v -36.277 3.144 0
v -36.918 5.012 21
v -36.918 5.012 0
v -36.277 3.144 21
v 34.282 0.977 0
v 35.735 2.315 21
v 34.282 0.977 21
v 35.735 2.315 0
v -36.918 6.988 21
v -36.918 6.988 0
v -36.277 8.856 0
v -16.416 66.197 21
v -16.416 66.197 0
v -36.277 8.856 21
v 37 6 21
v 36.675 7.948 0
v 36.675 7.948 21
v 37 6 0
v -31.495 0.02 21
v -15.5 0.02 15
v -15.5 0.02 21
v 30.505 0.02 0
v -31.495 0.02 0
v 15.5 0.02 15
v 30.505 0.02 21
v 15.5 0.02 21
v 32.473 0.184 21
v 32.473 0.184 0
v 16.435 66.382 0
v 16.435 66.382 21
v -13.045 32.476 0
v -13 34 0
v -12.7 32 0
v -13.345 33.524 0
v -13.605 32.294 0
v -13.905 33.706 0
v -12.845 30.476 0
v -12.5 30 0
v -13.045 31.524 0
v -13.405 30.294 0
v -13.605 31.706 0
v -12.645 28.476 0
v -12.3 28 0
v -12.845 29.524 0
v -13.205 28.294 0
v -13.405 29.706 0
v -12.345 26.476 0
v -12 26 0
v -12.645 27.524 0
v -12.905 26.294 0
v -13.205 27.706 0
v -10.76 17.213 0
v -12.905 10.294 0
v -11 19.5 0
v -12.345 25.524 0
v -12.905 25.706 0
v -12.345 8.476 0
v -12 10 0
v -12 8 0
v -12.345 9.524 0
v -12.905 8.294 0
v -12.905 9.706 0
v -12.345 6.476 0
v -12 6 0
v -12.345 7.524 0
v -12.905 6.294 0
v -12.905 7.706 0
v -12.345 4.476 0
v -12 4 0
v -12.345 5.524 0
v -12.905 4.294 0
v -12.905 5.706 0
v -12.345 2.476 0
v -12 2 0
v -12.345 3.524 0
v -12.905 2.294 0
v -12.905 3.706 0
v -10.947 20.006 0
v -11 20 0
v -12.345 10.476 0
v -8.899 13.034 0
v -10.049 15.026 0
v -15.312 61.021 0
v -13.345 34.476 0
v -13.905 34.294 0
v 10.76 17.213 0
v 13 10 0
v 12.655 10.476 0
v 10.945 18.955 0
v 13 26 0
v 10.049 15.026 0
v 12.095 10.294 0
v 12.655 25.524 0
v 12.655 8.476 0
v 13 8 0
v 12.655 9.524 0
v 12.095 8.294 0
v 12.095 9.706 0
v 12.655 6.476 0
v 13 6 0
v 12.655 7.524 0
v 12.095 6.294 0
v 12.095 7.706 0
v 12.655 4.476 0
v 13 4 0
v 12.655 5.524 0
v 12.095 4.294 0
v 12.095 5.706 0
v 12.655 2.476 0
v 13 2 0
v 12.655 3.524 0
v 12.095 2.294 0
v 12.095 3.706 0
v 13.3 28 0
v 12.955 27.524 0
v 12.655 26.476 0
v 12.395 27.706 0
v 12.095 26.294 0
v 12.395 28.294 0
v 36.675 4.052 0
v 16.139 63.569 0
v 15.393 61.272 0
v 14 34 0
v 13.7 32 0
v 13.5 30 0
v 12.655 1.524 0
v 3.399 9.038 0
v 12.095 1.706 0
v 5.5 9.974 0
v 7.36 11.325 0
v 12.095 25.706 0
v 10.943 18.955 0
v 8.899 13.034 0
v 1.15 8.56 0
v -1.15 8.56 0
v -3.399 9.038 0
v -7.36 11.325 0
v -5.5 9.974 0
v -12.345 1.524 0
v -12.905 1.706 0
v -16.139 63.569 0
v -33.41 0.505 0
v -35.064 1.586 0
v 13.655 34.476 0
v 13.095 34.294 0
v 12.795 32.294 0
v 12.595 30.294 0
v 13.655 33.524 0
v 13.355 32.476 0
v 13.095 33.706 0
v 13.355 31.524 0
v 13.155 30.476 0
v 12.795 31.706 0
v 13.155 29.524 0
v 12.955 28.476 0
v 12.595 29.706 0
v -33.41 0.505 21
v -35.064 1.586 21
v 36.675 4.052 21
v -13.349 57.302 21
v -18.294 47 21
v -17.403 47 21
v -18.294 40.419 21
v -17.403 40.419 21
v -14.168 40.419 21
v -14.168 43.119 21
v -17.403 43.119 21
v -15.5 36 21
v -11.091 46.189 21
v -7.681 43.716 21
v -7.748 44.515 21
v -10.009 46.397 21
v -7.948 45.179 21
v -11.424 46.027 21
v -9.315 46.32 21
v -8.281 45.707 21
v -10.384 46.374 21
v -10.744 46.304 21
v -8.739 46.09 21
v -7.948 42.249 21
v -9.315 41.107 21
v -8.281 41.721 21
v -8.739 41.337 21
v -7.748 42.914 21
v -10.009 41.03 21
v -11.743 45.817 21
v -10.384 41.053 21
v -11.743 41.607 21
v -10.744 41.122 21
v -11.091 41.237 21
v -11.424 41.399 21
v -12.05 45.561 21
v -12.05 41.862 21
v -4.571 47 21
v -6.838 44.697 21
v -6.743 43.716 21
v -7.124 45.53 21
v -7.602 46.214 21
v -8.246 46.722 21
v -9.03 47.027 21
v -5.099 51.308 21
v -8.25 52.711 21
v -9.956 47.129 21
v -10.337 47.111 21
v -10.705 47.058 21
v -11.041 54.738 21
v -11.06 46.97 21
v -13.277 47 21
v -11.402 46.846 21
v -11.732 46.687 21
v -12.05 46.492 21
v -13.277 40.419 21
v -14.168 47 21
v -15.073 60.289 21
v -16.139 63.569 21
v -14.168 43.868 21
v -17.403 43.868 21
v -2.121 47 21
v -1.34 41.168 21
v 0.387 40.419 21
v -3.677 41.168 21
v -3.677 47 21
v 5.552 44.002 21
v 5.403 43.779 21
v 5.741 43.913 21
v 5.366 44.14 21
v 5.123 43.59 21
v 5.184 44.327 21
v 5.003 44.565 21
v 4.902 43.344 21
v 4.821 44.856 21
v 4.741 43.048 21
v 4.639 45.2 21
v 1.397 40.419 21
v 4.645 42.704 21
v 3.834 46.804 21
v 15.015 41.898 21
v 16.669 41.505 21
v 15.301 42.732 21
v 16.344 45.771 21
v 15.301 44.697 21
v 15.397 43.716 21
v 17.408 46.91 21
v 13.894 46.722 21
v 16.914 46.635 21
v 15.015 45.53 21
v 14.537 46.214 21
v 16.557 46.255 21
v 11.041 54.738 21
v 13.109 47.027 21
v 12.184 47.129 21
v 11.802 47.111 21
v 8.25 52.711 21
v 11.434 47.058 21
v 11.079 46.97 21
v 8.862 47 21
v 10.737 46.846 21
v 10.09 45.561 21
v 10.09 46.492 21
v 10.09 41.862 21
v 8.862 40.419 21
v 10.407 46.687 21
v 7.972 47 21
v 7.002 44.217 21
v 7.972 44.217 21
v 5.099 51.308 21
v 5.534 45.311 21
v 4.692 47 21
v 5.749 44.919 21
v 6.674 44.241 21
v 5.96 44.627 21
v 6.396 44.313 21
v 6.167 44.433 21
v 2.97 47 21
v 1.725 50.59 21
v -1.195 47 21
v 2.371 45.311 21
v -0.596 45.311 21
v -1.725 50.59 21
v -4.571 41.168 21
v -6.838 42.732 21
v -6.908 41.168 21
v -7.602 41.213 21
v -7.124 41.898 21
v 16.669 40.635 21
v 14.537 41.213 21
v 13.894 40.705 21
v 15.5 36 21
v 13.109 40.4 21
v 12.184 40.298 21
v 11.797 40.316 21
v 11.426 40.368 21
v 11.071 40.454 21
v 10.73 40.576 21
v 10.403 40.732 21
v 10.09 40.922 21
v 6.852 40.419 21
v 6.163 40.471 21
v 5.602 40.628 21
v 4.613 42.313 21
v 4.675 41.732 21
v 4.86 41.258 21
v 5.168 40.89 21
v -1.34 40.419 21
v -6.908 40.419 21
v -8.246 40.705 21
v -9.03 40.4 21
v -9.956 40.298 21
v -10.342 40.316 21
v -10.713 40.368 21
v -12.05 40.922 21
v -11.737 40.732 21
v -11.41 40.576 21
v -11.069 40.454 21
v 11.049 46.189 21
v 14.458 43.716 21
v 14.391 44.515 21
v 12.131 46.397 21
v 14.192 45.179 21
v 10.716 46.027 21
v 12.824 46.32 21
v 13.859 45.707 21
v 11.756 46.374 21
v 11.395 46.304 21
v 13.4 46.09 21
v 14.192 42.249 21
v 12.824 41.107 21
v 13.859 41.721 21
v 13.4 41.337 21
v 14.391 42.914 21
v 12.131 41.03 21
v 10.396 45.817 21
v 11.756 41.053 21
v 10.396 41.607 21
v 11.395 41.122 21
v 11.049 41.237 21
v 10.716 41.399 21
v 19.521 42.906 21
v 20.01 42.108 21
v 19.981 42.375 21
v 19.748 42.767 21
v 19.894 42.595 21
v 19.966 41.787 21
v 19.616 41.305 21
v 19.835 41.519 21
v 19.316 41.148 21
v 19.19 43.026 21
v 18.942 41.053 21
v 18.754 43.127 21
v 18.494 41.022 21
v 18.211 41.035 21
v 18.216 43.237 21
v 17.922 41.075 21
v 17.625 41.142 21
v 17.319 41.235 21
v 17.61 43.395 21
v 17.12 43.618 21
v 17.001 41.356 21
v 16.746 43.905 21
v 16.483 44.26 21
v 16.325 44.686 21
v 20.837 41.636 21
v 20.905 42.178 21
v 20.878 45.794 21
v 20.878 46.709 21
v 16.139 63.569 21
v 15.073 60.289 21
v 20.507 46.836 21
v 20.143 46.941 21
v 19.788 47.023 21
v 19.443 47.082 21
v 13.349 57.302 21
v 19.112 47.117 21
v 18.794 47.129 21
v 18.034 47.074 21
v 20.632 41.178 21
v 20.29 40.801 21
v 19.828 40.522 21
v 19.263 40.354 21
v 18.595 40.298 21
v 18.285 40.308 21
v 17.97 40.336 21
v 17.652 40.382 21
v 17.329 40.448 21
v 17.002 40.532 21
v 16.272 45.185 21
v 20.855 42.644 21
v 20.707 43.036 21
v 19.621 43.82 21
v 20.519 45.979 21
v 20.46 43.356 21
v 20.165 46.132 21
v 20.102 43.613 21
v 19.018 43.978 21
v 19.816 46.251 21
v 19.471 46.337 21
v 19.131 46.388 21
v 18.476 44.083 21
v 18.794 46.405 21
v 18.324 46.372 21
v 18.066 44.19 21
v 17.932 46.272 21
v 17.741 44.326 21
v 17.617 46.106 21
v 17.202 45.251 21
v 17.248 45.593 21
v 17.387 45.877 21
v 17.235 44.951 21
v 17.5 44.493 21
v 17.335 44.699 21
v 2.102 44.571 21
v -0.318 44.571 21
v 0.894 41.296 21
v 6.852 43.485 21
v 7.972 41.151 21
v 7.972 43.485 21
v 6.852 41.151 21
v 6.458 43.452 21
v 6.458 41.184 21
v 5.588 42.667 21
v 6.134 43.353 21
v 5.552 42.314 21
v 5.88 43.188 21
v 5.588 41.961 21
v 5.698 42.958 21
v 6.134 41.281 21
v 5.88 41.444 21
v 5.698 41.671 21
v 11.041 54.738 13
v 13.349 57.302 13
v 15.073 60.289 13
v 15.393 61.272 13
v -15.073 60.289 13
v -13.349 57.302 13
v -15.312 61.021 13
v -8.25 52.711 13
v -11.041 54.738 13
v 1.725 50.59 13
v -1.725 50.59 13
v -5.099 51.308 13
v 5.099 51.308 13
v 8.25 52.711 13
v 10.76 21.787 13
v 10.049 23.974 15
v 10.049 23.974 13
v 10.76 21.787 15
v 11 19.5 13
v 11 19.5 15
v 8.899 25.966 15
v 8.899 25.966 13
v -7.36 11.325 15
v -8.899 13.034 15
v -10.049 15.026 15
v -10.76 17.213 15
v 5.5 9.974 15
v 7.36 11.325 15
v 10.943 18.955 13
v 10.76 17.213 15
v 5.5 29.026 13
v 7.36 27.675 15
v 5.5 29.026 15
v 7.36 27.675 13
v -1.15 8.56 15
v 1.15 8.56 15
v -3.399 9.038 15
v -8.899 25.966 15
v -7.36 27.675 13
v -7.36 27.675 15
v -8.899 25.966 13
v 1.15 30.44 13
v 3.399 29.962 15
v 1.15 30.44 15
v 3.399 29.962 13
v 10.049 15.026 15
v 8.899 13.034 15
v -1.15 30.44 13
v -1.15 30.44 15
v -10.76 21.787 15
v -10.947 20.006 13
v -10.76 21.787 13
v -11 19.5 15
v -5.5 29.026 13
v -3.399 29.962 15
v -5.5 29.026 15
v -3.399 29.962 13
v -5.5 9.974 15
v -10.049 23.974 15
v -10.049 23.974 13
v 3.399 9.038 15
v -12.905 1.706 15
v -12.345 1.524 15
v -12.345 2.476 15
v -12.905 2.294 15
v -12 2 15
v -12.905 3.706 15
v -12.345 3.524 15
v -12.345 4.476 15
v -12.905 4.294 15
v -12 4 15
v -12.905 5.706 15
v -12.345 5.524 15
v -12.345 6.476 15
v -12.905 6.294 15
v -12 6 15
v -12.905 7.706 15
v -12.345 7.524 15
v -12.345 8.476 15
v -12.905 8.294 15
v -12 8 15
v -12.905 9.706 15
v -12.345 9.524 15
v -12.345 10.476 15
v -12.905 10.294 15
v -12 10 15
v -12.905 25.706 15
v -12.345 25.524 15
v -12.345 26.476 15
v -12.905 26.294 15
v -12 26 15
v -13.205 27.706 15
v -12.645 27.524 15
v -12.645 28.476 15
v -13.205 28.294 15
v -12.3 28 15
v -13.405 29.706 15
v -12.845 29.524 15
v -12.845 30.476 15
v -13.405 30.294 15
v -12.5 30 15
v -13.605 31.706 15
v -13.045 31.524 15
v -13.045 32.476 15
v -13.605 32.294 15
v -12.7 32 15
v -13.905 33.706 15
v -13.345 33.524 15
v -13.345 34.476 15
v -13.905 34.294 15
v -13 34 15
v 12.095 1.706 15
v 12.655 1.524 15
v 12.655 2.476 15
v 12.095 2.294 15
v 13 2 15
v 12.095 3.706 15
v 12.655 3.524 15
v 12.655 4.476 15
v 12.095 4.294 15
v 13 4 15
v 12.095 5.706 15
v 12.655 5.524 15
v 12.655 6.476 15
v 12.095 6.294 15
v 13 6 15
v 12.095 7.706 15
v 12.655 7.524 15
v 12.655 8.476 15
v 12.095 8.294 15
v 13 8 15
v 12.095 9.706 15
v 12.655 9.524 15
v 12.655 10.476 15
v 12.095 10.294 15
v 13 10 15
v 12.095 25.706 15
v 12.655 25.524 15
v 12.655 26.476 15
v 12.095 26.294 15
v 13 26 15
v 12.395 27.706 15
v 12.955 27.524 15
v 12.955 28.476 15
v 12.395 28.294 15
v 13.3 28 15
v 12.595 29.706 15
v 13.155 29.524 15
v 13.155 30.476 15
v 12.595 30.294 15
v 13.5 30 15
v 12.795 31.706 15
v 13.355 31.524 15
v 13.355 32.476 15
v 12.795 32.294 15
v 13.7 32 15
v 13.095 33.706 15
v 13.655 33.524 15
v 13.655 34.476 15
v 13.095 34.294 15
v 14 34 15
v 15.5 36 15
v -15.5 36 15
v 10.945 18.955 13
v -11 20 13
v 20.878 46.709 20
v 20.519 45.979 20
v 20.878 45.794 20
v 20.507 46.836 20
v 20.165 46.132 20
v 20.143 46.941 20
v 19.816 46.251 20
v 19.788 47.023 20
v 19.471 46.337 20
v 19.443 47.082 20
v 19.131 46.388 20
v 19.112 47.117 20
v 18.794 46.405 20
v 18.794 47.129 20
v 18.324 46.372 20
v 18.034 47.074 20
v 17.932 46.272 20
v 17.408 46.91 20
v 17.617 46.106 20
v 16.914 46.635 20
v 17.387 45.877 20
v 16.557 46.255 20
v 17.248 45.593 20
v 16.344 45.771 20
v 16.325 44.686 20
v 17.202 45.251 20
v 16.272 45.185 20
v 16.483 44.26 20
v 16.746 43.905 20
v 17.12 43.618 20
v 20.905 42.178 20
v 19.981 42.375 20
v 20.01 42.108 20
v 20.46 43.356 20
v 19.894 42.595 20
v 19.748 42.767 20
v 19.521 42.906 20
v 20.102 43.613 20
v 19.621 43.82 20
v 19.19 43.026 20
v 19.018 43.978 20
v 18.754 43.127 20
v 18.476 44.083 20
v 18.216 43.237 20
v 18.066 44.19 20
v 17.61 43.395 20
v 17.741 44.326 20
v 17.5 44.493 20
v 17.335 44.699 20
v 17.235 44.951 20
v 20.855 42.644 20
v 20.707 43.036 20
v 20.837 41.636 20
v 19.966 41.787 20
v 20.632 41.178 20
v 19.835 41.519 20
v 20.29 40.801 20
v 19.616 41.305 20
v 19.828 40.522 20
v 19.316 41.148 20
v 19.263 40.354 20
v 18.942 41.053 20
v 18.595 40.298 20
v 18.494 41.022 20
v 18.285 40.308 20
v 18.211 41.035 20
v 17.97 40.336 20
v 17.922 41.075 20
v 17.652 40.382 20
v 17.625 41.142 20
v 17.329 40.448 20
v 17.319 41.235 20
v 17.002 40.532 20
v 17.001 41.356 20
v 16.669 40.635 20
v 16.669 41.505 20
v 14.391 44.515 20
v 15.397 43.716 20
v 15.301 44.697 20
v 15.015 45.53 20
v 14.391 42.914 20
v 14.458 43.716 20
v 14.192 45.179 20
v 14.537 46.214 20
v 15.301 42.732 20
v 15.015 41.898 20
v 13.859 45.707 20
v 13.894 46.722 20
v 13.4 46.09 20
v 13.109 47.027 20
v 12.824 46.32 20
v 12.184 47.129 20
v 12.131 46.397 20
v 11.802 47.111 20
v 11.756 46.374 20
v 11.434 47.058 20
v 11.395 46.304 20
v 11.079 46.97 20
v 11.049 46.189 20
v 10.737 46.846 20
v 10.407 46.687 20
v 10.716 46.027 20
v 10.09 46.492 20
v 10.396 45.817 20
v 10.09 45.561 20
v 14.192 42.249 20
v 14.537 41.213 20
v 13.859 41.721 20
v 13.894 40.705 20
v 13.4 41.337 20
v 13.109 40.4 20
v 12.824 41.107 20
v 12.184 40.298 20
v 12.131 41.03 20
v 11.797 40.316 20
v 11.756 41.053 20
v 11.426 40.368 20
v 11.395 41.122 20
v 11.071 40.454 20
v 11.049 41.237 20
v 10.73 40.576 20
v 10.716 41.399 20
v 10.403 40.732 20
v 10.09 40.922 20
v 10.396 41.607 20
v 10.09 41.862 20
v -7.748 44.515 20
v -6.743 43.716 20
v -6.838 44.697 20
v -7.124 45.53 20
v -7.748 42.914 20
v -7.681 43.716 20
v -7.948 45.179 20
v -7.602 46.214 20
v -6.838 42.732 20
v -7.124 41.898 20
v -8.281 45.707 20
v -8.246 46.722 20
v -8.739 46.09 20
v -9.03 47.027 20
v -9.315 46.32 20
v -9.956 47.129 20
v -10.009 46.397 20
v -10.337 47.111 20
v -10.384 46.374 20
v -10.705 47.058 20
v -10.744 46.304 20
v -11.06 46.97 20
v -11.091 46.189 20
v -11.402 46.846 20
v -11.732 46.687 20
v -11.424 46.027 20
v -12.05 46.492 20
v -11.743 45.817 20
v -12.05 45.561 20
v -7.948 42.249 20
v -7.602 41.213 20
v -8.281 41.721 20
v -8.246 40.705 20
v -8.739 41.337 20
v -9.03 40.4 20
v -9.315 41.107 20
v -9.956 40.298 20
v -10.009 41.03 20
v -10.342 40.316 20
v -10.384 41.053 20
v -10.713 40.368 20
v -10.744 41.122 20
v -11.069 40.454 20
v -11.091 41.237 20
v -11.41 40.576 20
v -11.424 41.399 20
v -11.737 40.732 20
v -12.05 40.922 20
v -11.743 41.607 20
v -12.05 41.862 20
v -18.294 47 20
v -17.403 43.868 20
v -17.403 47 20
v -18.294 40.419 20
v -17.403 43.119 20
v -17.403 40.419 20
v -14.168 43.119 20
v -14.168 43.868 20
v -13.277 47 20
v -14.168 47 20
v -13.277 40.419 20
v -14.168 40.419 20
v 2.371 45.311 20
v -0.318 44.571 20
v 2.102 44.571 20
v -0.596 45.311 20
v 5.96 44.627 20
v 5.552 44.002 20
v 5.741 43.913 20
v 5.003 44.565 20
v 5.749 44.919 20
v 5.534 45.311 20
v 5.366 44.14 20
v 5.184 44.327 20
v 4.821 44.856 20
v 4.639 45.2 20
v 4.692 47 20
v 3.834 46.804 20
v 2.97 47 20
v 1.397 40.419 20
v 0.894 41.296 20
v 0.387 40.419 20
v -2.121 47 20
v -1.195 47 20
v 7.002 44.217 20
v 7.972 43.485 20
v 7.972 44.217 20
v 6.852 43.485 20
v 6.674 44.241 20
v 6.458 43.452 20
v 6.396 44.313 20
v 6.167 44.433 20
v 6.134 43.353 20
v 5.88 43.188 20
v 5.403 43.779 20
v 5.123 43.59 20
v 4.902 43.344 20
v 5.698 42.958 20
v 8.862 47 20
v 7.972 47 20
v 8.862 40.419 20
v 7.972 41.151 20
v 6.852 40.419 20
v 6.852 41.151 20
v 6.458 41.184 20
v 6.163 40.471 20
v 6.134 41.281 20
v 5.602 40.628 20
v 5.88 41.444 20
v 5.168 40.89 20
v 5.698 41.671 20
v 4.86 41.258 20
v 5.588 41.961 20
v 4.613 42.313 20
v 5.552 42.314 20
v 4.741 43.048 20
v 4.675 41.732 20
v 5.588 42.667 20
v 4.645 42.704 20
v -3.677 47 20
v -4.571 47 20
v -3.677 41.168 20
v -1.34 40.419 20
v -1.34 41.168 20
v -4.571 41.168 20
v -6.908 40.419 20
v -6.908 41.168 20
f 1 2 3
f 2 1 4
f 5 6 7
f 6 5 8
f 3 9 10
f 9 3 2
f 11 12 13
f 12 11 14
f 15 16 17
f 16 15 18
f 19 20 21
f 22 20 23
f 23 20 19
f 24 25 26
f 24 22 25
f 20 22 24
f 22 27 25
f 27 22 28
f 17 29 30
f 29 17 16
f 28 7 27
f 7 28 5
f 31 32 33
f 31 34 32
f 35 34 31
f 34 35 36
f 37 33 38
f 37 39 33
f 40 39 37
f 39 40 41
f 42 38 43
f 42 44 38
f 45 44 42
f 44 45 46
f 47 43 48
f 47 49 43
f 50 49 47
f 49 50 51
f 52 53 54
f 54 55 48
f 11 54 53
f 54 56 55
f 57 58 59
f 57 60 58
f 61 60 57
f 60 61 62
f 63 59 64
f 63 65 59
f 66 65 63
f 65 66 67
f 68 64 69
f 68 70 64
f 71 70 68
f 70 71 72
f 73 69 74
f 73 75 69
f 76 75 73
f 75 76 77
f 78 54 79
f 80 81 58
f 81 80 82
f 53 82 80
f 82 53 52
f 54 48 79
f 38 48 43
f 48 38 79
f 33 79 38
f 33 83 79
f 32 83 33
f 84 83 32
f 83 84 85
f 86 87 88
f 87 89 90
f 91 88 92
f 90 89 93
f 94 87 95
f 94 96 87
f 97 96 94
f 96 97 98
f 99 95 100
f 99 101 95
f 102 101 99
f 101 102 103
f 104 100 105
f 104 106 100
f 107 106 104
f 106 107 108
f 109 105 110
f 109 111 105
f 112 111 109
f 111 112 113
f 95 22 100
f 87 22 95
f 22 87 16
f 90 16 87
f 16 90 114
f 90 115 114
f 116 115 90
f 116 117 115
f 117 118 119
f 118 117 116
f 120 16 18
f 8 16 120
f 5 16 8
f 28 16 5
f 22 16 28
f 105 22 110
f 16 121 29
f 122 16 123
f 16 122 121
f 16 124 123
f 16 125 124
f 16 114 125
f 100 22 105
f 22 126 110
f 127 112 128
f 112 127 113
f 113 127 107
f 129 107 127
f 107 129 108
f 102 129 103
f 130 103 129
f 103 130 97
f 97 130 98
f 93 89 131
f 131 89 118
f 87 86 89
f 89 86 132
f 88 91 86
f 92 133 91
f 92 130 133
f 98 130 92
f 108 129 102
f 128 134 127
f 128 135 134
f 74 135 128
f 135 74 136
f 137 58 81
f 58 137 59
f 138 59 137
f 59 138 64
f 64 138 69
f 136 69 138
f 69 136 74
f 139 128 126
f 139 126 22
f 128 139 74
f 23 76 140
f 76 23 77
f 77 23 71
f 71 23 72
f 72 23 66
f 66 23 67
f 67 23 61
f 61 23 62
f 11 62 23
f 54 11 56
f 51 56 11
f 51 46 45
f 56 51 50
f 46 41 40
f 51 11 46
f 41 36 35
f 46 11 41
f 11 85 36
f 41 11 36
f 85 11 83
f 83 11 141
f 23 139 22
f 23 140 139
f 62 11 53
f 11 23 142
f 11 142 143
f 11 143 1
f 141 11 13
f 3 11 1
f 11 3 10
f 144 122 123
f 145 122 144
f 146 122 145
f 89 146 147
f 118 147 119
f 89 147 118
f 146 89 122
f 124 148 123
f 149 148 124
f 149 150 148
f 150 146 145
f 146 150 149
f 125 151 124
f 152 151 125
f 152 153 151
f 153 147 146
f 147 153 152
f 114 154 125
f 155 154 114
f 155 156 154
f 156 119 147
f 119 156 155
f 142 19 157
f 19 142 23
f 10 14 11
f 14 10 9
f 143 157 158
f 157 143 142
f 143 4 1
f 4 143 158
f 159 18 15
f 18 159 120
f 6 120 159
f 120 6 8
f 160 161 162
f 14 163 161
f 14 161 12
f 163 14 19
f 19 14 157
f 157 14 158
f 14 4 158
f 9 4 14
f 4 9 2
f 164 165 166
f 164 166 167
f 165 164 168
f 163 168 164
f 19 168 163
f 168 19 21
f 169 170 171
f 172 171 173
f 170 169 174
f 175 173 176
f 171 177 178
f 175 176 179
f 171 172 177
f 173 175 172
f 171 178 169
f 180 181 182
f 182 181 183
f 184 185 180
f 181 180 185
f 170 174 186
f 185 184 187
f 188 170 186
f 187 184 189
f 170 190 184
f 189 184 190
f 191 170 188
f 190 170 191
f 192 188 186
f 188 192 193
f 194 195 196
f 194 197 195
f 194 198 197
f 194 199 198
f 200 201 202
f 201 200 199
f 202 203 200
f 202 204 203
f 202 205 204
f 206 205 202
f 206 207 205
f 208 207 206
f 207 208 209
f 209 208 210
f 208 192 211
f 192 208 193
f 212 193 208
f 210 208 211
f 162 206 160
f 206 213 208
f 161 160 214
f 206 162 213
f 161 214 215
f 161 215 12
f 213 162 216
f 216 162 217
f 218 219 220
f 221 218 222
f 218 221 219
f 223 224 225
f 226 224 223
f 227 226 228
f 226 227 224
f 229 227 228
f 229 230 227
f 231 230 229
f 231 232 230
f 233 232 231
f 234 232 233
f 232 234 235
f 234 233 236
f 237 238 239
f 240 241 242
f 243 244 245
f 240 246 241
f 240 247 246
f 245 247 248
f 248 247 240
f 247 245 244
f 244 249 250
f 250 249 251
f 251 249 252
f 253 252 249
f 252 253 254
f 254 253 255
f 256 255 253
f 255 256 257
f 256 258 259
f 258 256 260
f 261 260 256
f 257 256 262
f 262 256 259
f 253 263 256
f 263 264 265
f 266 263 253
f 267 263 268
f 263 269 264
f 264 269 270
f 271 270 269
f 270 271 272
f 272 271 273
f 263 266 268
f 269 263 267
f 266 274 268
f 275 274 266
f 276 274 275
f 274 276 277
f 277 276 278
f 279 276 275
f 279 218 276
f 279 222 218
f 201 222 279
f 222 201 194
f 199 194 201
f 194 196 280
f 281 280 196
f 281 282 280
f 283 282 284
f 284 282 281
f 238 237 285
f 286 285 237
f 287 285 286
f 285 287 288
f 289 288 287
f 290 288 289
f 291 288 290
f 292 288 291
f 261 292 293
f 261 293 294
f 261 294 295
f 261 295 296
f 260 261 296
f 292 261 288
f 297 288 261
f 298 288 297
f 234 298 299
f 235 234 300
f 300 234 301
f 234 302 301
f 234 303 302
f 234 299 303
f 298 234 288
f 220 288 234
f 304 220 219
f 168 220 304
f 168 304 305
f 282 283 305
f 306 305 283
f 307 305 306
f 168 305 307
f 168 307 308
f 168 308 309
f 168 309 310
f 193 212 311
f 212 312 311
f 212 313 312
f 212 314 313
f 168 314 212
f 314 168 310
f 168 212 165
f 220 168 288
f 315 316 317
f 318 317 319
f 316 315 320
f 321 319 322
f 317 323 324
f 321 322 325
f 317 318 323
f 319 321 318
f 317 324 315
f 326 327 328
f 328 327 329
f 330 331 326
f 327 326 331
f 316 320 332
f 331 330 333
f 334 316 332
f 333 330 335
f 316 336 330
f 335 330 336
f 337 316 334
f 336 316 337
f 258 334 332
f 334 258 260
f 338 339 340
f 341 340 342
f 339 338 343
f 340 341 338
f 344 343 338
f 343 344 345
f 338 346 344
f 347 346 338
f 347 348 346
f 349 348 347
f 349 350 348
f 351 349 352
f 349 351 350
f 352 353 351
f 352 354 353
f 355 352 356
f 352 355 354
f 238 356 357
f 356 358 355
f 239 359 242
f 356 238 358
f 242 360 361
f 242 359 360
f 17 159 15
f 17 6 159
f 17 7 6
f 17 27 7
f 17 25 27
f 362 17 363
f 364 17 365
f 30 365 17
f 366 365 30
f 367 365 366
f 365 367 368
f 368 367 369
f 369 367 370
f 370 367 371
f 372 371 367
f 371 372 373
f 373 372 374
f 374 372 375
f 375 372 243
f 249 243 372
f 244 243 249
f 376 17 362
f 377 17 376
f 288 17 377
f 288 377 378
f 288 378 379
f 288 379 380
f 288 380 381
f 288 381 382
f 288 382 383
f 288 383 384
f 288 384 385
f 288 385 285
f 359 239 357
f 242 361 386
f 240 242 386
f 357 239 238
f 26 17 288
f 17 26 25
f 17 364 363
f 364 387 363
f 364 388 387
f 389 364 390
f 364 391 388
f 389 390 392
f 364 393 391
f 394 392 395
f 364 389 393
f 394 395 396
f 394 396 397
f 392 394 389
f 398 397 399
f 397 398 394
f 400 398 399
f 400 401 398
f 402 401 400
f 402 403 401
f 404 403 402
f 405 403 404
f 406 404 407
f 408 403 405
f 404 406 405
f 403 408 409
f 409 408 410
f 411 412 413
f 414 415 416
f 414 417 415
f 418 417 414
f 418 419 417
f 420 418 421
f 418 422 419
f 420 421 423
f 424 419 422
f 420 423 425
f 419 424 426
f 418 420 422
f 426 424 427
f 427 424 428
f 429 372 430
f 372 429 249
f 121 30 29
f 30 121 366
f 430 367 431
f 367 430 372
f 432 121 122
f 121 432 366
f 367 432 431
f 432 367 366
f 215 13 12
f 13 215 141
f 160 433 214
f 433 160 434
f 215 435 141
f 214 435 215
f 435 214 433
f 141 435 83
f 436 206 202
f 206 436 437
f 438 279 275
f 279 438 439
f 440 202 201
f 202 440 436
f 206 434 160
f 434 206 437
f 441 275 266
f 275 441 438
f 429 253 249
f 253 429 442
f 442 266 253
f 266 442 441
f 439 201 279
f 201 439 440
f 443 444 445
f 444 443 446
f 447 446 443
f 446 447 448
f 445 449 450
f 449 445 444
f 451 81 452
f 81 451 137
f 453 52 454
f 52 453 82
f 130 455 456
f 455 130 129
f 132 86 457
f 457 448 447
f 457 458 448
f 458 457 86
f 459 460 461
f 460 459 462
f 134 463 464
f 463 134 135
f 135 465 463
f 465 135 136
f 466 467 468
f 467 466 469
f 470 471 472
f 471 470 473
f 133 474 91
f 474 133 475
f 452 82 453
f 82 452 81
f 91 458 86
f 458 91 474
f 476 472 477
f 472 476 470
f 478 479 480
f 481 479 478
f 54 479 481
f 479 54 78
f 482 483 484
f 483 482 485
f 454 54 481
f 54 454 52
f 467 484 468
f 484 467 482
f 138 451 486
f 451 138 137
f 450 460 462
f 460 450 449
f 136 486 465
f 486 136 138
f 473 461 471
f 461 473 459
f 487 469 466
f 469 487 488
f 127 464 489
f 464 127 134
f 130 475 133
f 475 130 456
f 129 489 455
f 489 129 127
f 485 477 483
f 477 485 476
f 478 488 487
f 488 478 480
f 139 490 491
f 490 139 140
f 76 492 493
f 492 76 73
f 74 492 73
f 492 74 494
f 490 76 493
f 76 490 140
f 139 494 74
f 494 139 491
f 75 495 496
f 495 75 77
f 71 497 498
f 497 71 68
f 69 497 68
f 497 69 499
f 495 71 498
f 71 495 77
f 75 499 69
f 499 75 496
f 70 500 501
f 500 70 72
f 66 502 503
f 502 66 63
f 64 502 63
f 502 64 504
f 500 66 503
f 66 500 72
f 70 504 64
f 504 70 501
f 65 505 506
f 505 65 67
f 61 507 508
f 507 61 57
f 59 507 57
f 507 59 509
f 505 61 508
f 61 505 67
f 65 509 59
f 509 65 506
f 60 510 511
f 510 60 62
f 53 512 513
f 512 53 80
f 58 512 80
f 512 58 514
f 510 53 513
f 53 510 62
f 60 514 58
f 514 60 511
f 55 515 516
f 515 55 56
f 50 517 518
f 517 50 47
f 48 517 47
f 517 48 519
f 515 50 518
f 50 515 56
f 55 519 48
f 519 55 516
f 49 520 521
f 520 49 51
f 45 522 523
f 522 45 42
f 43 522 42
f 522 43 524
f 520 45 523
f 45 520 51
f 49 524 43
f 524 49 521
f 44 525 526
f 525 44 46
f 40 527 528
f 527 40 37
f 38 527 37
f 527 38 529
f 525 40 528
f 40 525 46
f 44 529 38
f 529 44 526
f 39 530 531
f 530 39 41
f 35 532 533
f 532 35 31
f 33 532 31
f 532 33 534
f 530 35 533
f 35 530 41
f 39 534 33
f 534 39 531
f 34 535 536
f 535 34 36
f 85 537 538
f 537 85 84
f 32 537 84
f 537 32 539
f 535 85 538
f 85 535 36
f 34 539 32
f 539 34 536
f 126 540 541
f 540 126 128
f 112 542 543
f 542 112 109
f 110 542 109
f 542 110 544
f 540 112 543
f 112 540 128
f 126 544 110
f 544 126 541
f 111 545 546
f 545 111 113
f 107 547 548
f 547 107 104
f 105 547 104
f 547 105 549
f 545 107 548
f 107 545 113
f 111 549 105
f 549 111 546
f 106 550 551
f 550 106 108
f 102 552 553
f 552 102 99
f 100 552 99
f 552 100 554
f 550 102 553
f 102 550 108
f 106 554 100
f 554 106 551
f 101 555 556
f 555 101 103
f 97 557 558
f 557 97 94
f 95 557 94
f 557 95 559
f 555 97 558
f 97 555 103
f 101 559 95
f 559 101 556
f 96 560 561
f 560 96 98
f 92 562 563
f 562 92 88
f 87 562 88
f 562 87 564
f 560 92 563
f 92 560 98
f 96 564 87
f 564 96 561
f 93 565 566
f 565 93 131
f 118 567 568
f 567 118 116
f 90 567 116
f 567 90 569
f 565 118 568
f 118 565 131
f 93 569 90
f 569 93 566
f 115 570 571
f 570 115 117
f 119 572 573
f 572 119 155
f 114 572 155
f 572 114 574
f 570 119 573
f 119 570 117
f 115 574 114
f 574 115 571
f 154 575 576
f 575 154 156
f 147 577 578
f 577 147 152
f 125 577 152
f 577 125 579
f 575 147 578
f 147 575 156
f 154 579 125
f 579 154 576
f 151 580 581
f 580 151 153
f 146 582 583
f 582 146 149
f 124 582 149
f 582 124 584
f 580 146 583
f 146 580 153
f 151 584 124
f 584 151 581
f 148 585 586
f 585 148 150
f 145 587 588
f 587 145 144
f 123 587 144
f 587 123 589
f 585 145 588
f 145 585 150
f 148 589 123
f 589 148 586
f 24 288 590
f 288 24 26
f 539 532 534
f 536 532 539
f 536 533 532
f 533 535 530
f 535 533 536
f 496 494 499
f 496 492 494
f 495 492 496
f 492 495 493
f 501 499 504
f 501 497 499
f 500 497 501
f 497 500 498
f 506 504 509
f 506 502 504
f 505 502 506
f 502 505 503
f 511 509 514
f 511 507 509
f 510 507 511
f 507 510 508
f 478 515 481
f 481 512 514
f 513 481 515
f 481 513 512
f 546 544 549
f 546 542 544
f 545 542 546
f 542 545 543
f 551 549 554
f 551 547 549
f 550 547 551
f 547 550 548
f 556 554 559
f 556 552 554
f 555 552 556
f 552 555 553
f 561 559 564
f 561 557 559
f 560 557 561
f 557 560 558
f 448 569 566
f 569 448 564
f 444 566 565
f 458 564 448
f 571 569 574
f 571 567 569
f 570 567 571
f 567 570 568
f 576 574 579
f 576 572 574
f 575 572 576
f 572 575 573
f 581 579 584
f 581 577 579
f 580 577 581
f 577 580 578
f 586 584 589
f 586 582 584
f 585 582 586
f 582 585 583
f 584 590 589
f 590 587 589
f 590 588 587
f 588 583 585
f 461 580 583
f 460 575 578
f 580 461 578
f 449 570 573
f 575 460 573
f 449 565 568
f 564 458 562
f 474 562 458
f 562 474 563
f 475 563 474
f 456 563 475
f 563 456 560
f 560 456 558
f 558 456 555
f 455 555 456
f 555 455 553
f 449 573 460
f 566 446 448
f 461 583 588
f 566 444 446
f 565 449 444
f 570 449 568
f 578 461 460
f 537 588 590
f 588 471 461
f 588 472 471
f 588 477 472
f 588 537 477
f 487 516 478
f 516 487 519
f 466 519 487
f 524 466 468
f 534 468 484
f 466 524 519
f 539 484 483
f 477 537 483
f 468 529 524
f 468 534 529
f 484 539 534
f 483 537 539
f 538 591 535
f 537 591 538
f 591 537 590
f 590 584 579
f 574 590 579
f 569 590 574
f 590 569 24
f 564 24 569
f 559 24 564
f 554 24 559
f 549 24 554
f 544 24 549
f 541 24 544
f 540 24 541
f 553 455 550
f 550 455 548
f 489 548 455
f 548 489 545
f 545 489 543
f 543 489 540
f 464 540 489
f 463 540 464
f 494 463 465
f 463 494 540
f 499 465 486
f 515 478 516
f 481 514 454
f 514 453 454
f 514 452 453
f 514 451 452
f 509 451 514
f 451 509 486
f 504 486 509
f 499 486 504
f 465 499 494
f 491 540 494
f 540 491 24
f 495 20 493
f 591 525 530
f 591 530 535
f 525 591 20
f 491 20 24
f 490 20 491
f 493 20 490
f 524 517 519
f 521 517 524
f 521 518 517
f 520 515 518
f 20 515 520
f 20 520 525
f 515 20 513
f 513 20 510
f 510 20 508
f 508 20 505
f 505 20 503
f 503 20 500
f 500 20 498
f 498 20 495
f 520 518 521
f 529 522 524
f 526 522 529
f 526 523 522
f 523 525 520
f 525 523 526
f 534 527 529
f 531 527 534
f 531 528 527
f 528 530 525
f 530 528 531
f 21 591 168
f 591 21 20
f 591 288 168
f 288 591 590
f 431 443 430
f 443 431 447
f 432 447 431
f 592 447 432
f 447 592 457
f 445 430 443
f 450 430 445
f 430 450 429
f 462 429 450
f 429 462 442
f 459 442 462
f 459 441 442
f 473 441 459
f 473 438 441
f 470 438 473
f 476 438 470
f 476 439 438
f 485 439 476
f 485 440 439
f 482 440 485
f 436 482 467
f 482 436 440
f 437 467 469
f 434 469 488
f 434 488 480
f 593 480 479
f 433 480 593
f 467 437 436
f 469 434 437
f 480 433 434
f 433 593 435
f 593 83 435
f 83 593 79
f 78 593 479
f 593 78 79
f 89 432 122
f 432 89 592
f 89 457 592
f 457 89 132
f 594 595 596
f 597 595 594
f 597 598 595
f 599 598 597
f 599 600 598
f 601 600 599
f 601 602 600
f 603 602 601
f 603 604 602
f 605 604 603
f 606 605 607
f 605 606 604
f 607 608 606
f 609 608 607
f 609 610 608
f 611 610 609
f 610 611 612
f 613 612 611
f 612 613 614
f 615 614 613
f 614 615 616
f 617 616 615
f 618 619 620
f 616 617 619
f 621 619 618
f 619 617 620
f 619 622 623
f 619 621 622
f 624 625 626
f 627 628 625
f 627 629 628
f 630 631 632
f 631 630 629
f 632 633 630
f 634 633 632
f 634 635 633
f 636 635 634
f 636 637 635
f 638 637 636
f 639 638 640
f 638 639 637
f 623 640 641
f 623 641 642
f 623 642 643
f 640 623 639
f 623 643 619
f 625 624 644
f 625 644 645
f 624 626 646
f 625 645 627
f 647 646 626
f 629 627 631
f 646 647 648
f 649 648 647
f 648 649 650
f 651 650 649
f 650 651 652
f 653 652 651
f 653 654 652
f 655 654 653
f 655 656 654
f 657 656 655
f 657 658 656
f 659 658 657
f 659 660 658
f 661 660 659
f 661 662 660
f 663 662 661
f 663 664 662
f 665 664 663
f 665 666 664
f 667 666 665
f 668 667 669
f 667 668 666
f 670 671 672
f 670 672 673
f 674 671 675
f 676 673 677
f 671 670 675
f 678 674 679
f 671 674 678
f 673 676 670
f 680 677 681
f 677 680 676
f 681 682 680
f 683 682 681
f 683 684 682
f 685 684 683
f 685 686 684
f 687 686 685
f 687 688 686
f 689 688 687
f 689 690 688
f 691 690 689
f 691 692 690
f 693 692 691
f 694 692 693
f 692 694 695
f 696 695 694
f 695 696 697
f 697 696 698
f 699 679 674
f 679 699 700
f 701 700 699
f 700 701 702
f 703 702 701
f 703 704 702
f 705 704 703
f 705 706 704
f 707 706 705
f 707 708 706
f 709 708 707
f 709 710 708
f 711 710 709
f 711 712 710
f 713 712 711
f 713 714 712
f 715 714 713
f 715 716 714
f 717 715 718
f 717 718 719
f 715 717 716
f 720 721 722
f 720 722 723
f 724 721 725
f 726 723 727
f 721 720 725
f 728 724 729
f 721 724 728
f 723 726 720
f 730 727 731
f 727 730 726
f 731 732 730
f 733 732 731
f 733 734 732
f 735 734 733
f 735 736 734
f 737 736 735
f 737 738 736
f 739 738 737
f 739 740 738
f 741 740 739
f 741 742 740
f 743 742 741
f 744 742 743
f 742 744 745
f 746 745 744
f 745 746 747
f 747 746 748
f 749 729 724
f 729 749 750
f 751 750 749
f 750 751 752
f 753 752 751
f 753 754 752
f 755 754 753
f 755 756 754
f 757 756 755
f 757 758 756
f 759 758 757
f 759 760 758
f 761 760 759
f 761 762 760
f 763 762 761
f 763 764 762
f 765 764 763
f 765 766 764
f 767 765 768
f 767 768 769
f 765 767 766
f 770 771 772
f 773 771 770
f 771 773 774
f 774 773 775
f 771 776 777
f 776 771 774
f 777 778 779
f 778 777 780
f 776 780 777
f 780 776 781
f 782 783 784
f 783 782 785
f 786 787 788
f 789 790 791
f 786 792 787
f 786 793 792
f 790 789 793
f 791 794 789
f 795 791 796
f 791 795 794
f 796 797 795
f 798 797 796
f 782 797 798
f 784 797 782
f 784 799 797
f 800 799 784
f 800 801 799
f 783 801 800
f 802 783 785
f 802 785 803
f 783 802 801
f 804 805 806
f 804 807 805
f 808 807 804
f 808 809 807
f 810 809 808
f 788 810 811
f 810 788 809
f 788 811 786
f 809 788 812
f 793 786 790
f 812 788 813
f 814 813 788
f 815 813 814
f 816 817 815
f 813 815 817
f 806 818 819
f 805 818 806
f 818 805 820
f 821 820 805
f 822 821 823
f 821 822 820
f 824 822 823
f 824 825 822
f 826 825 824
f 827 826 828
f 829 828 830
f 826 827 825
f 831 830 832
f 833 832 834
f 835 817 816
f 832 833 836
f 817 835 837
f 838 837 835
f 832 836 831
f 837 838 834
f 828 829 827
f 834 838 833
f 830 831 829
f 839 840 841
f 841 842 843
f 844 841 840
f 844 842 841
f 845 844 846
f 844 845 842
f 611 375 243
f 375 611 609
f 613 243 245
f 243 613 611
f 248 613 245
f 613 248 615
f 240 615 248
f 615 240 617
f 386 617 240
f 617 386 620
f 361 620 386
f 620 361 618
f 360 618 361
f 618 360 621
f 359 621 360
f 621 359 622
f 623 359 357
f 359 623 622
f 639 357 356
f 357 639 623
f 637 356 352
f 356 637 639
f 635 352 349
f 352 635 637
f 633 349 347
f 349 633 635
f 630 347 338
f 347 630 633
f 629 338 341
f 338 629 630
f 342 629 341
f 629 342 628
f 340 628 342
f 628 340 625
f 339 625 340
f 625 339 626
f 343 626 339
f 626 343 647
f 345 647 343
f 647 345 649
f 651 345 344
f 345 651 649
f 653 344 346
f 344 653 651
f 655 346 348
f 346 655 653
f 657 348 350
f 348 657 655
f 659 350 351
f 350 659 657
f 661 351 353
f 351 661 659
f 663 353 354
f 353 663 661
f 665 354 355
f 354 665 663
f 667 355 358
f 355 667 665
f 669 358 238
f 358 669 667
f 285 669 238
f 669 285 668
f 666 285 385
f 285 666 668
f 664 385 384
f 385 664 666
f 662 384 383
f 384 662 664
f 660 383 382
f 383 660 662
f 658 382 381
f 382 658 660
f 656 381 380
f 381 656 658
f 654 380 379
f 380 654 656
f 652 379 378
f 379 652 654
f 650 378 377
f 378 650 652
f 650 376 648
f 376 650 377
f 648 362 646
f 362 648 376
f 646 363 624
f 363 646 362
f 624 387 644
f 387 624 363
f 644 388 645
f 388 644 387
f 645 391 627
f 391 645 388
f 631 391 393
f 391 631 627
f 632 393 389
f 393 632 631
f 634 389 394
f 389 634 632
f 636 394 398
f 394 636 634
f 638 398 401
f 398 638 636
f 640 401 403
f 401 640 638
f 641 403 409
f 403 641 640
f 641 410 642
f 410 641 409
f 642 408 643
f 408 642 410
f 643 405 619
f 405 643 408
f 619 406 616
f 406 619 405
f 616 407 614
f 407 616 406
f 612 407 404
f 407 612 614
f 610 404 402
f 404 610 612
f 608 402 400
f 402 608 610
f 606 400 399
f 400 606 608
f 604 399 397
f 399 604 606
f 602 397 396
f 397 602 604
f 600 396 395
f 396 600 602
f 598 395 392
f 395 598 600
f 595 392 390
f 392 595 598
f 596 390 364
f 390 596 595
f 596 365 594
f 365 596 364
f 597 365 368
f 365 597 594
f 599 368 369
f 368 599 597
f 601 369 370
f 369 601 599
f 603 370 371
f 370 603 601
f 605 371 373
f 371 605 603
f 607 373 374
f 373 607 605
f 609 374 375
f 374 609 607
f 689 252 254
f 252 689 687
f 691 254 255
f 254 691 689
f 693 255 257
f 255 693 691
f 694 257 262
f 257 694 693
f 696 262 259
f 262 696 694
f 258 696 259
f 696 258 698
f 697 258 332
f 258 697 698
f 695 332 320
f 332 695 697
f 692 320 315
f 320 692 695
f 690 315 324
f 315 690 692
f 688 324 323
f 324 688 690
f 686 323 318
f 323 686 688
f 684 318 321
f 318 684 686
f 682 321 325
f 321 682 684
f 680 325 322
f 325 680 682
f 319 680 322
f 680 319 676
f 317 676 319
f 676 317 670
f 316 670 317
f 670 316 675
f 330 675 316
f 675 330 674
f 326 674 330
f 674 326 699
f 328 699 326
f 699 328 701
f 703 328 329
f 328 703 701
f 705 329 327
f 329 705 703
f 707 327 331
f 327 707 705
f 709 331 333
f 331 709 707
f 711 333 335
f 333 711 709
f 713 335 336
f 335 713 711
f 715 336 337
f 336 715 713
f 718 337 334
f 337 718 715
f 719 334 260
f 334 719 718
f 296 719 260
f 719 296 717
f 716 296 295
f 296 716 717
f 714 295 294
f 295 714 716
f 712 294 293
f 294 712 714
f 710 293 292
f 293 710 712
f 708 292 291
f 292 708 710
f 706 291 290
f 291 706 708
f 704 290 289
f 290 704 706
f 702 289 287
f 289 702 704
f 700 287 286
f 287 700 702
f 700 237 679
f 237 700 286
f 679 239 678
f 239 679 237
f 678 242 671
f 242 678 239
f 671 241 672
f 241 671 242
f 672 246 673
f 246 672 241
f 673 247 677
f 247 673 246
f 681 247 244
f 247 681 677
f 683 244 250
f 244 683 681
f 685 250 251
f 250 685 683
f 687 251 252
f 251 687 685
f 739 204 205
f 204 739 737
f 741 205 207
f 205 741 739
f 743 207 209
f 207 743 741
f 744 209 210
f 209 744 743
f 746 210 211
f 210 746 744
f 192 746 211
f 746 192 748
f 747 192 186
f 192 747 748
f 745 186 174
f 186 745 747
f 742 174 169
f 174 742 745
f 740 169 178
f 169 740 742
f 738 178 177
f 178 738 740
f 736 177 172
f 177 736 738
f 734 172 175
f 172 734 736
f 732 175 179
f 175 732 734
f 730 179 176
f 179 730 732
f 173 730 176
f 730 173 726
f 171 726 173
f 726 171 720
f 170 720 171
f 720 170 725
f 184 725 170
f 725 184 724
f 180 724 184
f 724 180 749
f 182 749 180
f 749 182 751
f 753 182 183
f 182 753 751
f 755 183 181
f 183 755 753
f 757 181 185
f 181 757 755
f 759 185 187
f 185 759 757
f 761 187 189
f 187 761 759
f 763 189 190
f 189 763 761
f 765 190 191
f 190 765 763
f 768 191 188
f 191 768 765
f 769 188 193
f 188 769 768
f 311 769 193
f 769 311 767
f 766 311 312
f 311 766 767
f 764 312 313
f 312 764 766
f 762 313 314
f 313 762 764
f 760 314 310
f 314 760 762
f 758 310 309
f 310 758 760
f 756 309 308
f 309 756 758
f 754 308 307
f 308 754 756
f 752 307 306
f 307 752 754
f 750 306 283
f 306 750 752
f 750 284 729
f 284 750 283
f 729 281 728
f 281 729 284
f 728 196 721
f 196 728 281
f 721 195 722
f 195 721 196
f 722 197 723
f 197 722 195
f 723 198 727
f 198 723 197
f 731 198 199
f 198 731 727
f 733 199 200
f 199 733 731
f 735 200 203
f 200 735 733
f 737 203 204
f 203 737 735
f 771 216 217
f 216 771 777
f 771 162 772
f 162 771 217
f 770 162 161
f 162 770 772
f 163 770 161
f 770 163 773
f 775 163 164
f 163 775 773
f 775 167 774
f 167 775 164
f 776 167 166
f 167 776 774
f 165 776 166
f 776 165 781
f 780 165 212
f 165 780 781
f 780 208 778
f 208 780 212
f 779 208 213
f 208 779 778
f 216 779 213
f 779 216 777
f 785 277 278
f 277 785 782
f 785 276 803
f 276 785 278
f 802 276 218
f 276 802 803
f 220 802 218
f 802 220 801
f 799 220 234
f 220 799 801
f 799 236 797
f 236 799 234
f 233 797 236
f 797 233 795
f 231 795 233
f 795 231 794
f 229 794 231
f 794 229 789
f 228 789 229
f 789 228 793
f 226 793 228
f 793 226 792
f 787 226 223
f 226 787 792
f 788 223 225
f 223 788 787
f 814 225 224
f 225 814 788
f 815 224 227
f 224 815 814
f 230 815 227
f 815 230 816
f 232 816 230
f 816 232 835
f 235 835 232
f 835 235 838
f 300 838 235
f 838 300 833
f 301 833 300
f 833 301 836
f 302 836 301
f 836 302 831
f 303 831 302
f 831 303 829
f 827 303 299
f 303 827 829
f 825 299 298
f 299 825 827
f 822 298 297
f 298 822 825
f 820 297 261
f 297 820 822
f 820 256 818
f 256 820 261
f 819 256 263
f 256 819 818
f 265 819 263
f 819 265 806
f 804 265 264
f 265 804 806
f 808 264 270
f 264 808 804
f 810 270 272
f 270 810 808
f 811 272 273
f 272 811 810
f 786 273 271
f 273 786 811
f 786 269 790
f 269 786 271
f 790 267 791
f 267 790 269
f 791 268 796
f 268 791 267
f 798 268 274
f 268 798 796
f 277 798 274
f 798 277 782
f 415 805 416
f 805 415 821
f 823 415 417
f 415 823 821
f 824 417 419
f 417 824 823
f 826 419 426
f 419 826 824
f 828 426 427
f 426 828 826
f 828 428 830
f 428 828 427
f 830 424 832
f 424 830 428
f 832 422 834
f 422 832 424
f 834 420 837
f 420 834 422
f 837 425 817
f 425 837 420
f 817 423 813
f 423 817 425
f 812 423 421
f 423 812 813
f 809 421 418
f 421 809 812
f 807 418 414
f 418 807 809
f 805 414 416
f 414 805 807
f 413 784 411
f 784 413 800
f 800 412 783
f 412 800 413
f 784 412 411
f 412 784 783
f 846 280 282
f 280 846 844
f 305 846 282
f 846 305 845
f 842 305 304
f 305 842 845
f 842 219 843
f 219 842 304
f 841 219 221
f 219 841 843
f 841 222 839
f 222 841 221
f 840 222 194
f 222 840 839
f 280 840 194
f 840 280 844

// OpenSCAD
difference()
{
    union()
    {
        translate([0, 68, 0])
            cylinder(r=15, h = 21);
        color( "Red", 1 )
        difference()
        {
            minkowski()
            {
                translate([-31, 6, 10])
                    linear_extrude(height = 20, center = true, convexity =                  10,twist = 0)
                        polygon(points=[[0,0],[62,0],[31,89.5]], paths=[[0                      ,1,2]],convexity=10);
                cylinder(r=6);
            }
            translate([-45,74,-5]) cube([90,50,30]);
        }
    }
    
    //weapon axis hole
    translate([0, 67, 0]) cylinder(r=16.5, h = 21);
    
    //motor hole
    translate([0, 19.5, 0]) cylinder(r=11, h = 21);
    
    translate([-12.5, 2, 0]) cylinder(r=0.5, h = 21);
    translate([-12.5, 4, 0]) cylinder(r=0.5, h = 21);
    translate([-12.5, 6, 0]) cylinder(r=0.5, h = 21);
    translate([-12.5, 8, 0]) cylinder(r=0.5, h = 21);
    translate([-12.5, 10, 0]) cylinder(r=0.5, h = 21);
    
    translate([-12.5, 26, 0]) cylinder(r=0.5, h = 21);
    translate([-12.8, 28, 0]) cylinder(r=0.5, h = 21);
    translate([-13.0, 30, 0]) cylinder(r=0.5, h = 21);
    translate([-13.2, 32, 0]) cylinder(r=0.5, h = 21);
    translate([-13.5, 34, 0]) cylinder(r=0.5, h = 21);
    
    translate([12.5, 2, 0]) cylinder(r=0.5, h = 21);
    translate([12.5, 4, 0]) cylinder(r=0.5, h = 21);
    translate([12.5, 6, 0]) cylinder(r=0.5, h = 21);
    translate([12.5, 8, 0]) cylinder(r=0.5, h = 21);
    translate([12.5, 10, 0]) cylinder(r=0.5, h = 21);
    
    translate([12.5, 26, 0]) cylinder(r=0.5, h = 21);
    translate([12.8, 28, 0]) cylinder(r=0.5, h = 21);
    translate([13.0, 30, 0]) cylinder(r=0.5, h = 21);
    translate([13.2, 32, 0]) cylinder(r=0.5, h = 21);
    translate([13.5, 34, 0]) cylinder(r=0.5, h = 21);
    
    translate([-15.5,0,15]) cube([31,36,20]);
    
    
    //belt space
    translate([-11,20,-9]) rotate([0,0,6]) cube([10,45,22]);
    translate([1,20,-9]) rotate([0,0,-6]) cube([10,45,22]);
    translate([-5,20,-9]) cube([10,45,22]);
    
    translate([21.5,47,20]) rotate([0,0,180])
    linear_extrude(height = 2)
    text(text = "SCRATCH", font = "Arial Rounded MT Bold:style=Regular", size = 6.5);
    
    
}
